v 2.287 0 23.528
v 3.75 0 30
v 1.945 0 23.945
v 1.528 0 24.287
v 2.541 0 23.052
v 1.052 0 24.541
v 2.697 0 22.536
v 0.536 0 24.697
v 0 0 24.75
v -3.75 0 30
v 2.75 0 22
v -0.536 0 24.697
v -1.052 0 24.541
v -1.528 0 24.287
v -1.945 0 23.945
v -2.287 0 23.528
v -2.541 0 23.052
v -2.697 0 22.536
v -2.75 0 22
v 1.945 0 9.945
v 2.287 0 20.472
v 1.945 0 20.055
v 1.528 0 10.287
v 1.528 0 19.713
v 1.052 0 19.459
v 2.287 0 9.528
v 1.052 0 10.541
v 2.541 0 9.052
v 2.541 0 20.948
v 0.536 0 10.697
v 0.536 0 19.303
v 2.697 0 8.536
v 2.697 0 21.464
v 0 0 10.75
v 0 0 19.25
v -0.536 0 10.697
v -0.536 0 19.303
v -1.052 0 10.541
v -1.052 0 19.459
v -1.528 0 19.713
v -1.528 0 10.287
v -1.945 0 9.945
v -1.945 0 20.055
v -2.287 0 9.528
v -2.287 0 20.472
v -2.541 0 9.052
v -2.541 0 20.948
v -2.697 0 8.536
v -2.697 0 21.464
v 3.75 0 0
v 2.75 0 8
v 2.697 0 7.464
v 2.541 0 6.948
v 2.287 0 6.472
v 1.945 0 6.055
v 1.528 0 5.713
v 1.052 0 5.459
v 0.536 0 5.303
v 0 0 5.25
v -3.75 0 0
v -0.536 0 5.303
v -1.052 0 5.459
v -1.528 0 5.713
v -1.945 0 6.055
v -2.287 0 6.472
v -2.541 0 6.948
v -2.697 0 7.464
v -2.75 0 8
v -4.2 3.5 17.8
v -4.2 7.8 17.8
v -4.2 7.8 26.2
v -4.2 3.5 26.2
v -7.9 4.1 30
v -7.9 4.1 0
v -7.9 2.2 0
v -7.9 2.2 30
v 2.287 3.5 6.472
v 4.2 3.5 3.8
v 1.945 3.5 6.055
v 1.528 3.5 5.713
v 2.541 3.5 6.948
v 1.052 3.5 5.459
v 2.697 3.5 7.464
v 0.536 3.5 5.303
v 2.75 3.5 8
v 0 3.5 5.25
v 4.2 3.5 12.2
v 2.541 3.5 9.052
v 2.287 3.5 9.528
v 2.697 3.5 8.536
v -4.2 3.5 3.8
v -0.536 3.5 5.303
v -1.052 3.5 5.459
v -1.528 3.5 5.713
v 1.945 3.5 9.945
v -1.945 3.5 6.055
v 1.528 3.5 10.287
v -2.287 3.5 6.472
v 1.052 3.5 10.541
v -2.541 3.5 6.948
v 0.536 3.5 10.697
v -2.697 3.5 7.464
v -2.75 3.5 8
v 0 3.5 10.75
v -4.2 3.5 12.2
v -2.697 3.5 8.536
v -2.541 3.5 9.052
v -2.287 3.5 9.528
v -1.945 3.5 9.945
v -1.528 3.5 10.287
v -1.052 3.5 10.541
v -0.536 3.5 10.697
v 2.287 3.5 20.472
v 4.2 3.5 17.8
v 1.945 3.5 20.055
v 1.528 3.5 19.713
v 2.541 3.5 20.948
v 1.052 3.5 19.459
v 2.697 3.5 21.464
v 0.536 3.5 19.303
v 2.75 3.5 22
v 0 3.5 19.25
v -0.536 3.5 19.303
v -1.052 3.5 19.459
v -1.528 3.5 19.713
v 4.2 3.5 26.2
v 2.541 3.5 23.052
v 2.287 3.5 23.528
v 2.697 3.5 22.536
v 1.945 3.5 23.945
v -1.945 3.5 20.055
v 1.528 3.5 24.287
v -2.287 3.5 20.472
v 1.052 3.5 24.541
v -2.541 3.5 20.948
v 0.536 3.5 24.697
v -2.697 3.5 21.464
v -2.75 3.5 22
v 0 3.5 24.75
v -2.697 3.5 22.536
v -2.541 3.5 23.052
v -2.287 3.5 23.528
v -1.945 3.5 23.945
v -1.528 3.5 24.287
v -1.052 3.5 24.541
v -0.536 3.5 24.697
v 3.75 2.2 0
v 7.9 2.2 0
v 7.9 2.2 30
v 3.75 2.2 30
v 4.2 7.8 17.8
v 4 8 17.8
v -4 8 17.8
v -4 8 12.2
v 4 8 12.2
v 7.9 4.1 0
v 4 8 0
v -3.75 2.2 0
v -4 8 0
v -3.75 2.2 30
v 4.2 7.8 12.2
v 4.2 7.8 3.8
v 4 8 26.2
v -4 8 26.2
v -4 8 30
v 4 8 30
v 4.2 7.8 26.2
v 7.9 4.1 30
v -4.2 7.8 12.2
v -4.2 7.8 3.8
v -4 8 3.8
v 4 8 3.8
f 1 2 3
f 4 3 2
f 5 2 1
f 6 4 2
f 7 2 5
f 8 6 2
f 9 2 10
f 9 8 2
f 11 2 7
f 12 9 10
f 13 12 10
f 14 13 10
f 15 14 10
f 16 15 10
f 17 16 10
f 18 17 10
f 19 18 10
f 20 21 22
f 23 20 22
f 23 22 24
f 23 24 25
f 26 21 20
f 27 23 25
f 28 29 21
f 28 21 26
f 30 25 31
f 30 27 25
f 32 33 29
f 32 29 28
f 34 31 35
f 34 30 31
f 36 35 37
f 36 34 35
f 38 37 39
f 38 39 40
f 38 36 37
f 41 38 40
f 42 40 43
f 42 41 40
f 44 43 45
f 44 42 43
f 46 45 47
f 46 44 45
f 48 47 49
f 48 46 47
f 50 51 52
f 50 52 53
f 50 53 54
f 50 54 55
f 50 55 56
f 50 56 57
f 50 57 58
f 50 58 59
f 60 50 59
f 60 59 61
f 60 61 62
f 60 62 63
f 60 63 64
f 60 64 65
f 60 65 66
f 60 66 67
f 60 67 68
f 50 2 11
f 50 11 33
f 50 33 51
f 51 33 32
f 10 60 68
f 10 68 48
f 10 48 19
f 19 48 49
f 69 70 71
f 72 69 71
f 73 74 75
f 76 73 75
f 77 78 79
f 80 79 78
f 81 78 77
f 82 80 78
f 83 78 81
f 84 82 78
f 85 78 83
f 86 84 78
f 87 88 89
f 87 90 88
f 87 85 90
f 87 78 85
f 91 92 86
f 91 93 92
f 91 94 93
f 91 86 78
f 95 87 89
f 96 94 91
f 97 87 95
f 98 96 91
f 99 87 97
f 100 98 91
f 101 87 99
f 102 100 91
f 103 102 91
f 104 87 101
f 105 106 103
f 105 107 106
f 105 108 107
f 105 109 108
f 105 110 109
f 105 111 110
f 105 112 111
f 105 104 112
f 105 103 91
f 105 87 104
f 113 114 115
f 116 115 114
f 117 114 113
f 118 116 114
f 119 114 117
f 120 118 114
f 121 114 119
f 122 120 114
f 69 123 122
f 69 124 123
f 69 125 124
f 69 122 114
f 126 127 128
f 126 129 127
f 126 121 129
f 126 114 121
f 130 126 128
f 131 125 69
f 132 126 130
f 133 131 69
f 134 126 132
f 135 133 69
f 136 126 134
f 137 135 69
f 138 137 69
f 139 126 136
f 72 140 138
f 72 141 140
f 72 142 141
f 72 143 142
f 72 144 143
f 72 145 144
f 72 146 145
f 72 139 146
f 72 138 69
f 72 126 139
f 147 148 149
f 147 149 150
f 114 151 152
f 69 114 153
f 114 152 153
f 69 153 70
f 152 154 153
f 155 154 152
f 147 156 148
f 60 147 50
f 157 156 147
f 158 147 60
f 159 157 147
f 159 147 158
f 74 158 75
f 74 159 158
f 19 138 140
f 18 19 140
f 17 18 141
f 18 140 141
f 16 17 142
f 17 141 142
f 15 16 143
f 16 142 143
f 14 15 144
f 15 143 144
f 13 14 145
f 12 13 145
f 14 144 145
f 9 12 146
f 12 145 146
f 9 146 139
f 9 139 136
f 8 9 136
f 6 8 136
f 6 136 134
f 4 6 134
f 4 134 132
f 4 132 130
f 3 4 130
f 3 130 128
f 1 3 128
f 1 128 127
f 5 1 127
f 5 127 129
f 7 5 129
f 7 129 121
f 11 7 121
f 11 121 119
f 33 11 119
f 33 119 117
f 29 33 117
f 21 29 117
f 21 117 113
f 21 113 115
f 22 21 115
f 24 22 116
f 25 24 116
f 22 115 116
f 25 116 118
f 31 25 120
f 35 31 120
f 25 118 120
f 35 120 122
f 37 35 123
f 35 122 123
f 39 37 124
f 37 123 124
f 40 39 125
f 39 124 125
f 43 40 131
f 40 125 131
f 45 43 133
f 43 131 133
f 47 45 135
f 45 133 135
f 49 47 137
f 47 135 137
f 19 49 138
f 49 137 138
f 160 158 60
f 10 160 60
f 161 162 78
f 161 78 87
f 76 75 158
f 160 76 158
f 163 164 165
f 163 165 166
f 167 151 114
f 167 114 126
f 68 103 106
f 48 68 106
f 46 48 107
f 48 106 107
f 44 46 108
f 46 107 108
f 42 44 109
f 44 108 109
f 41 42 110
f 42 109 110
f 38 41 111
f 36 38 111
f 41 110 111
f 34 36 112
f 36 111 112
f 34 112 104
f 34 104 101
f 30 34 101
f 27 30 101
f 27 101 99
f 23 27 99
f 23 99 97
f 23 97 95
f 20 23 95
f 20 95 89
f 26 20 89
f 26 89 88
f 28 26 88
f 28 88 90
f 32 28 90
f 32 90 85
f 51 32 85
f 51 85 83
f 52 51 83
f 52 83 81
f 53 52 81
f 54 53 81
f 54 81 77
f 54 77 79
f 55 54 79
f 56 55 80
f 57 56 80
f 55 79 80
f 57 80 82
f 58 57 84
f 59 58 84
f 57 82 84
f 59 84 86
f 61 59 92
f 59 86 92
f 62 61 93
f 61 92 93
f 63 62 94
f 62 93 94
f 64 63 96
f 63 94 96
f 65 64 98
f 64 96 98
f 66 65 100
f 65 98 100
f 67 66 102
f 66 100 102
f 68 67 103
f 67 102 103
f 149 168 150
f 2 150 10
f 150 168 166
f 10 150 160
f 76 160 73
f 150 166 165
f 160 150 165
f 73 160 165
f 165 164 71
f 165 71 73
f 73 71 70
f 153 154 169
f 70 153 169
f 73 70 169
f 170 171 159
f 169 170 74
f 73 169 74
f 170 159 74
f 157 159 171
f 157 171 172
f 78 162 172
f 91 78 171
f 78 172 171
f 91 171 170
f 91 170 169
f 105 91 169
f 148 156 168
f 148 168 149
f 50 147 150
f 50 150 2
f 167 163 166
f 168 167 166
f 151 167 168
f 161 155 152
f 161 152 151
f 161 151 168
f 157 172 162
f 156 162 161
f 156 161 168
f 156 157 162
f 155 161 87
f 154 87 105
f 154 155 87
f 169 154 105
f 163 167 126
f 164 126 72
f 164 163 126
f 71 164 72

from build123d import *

# Parameters (mm, degrees)
PAD003_DEPTH           = 30
SKETCH005_W            = 8.4
SKETCH005_H            = 8.4
POCKET001_DEPTH        = 4.5
LINEARPATTERN002_COUNT = 2
LINEARPATTERN002_PITCH = 14
SKETCH004_R            = 2.75
HOLE001_DEPTH          = 25
LINEARPATTERN003_COUNT = 2
LINEARPATTERN003_PITCH = 14


with BuildPart() as part:
    # Sketch006 → Pad003 (new body)
    with BuildSketch(Plane.XY):
        Polygon((0, 0), (0, 8), (-4, 8), (-7.9, 4.1), (-7.9, 2.2), (-3.75, 2.2), (-3.75, 0), align=None)
    pad003 = extrude(amount=PAD003_DEPTH)

    # Mirrored001: Pad003 across Sketch006 V_Axis
    add(pad003.mirror(Plane(origin=(0, 0, 0), x_dir=(0, 0, 1), z_dir=(1, 0, 0))))

    # Sketch005 (on DatumPlane) → Pocket001 (cut)
    with BuildSketch(Plane(origin=(0, 8, 0), x_dir=(-1, 0, 0), z_dir=(0, 1, 0))):
        with Locations((0, 8)):
            Rectangle(SKETCH005_W, SKETCH005_H)
    pocket001 = extrude(amount=-POCKET001_DEPTH, mode=Mode.SUBTRACT)

    # LinearPattern002: Pocket001 ×2
    with Locations(*[(0, 0, i * LINEARPATTERN002_PITCH) for i in range(1, LINEARPATTERN002_COUNT)]):
        add(pocket001, mode=Mode.SUBTRACT)

    # Sketch004 (on DatumPlane) → Hole001 (cut)
    with BuildSketch(Plane(origin=(0, 8, 0), x_dir=(-1, 0, 0), z_dir=(0, 1, 0))):
        with Locations((0, 8)):
            Circle(SKETCH004_R)
    hole001 = extrude(amount=-HOLE001_DEPTH, mode=Mode.SUBTRACT)

    # LinearPattern003: Hole001 ×2
    with Locations(*[(0, 0, i * LINEARPATTERN003_PITCH) for i in range(1, LINEARPATTERN003_COUNT)]):
        add(hole001, mode=Mode.SUBTRACT)


solid = part.part
